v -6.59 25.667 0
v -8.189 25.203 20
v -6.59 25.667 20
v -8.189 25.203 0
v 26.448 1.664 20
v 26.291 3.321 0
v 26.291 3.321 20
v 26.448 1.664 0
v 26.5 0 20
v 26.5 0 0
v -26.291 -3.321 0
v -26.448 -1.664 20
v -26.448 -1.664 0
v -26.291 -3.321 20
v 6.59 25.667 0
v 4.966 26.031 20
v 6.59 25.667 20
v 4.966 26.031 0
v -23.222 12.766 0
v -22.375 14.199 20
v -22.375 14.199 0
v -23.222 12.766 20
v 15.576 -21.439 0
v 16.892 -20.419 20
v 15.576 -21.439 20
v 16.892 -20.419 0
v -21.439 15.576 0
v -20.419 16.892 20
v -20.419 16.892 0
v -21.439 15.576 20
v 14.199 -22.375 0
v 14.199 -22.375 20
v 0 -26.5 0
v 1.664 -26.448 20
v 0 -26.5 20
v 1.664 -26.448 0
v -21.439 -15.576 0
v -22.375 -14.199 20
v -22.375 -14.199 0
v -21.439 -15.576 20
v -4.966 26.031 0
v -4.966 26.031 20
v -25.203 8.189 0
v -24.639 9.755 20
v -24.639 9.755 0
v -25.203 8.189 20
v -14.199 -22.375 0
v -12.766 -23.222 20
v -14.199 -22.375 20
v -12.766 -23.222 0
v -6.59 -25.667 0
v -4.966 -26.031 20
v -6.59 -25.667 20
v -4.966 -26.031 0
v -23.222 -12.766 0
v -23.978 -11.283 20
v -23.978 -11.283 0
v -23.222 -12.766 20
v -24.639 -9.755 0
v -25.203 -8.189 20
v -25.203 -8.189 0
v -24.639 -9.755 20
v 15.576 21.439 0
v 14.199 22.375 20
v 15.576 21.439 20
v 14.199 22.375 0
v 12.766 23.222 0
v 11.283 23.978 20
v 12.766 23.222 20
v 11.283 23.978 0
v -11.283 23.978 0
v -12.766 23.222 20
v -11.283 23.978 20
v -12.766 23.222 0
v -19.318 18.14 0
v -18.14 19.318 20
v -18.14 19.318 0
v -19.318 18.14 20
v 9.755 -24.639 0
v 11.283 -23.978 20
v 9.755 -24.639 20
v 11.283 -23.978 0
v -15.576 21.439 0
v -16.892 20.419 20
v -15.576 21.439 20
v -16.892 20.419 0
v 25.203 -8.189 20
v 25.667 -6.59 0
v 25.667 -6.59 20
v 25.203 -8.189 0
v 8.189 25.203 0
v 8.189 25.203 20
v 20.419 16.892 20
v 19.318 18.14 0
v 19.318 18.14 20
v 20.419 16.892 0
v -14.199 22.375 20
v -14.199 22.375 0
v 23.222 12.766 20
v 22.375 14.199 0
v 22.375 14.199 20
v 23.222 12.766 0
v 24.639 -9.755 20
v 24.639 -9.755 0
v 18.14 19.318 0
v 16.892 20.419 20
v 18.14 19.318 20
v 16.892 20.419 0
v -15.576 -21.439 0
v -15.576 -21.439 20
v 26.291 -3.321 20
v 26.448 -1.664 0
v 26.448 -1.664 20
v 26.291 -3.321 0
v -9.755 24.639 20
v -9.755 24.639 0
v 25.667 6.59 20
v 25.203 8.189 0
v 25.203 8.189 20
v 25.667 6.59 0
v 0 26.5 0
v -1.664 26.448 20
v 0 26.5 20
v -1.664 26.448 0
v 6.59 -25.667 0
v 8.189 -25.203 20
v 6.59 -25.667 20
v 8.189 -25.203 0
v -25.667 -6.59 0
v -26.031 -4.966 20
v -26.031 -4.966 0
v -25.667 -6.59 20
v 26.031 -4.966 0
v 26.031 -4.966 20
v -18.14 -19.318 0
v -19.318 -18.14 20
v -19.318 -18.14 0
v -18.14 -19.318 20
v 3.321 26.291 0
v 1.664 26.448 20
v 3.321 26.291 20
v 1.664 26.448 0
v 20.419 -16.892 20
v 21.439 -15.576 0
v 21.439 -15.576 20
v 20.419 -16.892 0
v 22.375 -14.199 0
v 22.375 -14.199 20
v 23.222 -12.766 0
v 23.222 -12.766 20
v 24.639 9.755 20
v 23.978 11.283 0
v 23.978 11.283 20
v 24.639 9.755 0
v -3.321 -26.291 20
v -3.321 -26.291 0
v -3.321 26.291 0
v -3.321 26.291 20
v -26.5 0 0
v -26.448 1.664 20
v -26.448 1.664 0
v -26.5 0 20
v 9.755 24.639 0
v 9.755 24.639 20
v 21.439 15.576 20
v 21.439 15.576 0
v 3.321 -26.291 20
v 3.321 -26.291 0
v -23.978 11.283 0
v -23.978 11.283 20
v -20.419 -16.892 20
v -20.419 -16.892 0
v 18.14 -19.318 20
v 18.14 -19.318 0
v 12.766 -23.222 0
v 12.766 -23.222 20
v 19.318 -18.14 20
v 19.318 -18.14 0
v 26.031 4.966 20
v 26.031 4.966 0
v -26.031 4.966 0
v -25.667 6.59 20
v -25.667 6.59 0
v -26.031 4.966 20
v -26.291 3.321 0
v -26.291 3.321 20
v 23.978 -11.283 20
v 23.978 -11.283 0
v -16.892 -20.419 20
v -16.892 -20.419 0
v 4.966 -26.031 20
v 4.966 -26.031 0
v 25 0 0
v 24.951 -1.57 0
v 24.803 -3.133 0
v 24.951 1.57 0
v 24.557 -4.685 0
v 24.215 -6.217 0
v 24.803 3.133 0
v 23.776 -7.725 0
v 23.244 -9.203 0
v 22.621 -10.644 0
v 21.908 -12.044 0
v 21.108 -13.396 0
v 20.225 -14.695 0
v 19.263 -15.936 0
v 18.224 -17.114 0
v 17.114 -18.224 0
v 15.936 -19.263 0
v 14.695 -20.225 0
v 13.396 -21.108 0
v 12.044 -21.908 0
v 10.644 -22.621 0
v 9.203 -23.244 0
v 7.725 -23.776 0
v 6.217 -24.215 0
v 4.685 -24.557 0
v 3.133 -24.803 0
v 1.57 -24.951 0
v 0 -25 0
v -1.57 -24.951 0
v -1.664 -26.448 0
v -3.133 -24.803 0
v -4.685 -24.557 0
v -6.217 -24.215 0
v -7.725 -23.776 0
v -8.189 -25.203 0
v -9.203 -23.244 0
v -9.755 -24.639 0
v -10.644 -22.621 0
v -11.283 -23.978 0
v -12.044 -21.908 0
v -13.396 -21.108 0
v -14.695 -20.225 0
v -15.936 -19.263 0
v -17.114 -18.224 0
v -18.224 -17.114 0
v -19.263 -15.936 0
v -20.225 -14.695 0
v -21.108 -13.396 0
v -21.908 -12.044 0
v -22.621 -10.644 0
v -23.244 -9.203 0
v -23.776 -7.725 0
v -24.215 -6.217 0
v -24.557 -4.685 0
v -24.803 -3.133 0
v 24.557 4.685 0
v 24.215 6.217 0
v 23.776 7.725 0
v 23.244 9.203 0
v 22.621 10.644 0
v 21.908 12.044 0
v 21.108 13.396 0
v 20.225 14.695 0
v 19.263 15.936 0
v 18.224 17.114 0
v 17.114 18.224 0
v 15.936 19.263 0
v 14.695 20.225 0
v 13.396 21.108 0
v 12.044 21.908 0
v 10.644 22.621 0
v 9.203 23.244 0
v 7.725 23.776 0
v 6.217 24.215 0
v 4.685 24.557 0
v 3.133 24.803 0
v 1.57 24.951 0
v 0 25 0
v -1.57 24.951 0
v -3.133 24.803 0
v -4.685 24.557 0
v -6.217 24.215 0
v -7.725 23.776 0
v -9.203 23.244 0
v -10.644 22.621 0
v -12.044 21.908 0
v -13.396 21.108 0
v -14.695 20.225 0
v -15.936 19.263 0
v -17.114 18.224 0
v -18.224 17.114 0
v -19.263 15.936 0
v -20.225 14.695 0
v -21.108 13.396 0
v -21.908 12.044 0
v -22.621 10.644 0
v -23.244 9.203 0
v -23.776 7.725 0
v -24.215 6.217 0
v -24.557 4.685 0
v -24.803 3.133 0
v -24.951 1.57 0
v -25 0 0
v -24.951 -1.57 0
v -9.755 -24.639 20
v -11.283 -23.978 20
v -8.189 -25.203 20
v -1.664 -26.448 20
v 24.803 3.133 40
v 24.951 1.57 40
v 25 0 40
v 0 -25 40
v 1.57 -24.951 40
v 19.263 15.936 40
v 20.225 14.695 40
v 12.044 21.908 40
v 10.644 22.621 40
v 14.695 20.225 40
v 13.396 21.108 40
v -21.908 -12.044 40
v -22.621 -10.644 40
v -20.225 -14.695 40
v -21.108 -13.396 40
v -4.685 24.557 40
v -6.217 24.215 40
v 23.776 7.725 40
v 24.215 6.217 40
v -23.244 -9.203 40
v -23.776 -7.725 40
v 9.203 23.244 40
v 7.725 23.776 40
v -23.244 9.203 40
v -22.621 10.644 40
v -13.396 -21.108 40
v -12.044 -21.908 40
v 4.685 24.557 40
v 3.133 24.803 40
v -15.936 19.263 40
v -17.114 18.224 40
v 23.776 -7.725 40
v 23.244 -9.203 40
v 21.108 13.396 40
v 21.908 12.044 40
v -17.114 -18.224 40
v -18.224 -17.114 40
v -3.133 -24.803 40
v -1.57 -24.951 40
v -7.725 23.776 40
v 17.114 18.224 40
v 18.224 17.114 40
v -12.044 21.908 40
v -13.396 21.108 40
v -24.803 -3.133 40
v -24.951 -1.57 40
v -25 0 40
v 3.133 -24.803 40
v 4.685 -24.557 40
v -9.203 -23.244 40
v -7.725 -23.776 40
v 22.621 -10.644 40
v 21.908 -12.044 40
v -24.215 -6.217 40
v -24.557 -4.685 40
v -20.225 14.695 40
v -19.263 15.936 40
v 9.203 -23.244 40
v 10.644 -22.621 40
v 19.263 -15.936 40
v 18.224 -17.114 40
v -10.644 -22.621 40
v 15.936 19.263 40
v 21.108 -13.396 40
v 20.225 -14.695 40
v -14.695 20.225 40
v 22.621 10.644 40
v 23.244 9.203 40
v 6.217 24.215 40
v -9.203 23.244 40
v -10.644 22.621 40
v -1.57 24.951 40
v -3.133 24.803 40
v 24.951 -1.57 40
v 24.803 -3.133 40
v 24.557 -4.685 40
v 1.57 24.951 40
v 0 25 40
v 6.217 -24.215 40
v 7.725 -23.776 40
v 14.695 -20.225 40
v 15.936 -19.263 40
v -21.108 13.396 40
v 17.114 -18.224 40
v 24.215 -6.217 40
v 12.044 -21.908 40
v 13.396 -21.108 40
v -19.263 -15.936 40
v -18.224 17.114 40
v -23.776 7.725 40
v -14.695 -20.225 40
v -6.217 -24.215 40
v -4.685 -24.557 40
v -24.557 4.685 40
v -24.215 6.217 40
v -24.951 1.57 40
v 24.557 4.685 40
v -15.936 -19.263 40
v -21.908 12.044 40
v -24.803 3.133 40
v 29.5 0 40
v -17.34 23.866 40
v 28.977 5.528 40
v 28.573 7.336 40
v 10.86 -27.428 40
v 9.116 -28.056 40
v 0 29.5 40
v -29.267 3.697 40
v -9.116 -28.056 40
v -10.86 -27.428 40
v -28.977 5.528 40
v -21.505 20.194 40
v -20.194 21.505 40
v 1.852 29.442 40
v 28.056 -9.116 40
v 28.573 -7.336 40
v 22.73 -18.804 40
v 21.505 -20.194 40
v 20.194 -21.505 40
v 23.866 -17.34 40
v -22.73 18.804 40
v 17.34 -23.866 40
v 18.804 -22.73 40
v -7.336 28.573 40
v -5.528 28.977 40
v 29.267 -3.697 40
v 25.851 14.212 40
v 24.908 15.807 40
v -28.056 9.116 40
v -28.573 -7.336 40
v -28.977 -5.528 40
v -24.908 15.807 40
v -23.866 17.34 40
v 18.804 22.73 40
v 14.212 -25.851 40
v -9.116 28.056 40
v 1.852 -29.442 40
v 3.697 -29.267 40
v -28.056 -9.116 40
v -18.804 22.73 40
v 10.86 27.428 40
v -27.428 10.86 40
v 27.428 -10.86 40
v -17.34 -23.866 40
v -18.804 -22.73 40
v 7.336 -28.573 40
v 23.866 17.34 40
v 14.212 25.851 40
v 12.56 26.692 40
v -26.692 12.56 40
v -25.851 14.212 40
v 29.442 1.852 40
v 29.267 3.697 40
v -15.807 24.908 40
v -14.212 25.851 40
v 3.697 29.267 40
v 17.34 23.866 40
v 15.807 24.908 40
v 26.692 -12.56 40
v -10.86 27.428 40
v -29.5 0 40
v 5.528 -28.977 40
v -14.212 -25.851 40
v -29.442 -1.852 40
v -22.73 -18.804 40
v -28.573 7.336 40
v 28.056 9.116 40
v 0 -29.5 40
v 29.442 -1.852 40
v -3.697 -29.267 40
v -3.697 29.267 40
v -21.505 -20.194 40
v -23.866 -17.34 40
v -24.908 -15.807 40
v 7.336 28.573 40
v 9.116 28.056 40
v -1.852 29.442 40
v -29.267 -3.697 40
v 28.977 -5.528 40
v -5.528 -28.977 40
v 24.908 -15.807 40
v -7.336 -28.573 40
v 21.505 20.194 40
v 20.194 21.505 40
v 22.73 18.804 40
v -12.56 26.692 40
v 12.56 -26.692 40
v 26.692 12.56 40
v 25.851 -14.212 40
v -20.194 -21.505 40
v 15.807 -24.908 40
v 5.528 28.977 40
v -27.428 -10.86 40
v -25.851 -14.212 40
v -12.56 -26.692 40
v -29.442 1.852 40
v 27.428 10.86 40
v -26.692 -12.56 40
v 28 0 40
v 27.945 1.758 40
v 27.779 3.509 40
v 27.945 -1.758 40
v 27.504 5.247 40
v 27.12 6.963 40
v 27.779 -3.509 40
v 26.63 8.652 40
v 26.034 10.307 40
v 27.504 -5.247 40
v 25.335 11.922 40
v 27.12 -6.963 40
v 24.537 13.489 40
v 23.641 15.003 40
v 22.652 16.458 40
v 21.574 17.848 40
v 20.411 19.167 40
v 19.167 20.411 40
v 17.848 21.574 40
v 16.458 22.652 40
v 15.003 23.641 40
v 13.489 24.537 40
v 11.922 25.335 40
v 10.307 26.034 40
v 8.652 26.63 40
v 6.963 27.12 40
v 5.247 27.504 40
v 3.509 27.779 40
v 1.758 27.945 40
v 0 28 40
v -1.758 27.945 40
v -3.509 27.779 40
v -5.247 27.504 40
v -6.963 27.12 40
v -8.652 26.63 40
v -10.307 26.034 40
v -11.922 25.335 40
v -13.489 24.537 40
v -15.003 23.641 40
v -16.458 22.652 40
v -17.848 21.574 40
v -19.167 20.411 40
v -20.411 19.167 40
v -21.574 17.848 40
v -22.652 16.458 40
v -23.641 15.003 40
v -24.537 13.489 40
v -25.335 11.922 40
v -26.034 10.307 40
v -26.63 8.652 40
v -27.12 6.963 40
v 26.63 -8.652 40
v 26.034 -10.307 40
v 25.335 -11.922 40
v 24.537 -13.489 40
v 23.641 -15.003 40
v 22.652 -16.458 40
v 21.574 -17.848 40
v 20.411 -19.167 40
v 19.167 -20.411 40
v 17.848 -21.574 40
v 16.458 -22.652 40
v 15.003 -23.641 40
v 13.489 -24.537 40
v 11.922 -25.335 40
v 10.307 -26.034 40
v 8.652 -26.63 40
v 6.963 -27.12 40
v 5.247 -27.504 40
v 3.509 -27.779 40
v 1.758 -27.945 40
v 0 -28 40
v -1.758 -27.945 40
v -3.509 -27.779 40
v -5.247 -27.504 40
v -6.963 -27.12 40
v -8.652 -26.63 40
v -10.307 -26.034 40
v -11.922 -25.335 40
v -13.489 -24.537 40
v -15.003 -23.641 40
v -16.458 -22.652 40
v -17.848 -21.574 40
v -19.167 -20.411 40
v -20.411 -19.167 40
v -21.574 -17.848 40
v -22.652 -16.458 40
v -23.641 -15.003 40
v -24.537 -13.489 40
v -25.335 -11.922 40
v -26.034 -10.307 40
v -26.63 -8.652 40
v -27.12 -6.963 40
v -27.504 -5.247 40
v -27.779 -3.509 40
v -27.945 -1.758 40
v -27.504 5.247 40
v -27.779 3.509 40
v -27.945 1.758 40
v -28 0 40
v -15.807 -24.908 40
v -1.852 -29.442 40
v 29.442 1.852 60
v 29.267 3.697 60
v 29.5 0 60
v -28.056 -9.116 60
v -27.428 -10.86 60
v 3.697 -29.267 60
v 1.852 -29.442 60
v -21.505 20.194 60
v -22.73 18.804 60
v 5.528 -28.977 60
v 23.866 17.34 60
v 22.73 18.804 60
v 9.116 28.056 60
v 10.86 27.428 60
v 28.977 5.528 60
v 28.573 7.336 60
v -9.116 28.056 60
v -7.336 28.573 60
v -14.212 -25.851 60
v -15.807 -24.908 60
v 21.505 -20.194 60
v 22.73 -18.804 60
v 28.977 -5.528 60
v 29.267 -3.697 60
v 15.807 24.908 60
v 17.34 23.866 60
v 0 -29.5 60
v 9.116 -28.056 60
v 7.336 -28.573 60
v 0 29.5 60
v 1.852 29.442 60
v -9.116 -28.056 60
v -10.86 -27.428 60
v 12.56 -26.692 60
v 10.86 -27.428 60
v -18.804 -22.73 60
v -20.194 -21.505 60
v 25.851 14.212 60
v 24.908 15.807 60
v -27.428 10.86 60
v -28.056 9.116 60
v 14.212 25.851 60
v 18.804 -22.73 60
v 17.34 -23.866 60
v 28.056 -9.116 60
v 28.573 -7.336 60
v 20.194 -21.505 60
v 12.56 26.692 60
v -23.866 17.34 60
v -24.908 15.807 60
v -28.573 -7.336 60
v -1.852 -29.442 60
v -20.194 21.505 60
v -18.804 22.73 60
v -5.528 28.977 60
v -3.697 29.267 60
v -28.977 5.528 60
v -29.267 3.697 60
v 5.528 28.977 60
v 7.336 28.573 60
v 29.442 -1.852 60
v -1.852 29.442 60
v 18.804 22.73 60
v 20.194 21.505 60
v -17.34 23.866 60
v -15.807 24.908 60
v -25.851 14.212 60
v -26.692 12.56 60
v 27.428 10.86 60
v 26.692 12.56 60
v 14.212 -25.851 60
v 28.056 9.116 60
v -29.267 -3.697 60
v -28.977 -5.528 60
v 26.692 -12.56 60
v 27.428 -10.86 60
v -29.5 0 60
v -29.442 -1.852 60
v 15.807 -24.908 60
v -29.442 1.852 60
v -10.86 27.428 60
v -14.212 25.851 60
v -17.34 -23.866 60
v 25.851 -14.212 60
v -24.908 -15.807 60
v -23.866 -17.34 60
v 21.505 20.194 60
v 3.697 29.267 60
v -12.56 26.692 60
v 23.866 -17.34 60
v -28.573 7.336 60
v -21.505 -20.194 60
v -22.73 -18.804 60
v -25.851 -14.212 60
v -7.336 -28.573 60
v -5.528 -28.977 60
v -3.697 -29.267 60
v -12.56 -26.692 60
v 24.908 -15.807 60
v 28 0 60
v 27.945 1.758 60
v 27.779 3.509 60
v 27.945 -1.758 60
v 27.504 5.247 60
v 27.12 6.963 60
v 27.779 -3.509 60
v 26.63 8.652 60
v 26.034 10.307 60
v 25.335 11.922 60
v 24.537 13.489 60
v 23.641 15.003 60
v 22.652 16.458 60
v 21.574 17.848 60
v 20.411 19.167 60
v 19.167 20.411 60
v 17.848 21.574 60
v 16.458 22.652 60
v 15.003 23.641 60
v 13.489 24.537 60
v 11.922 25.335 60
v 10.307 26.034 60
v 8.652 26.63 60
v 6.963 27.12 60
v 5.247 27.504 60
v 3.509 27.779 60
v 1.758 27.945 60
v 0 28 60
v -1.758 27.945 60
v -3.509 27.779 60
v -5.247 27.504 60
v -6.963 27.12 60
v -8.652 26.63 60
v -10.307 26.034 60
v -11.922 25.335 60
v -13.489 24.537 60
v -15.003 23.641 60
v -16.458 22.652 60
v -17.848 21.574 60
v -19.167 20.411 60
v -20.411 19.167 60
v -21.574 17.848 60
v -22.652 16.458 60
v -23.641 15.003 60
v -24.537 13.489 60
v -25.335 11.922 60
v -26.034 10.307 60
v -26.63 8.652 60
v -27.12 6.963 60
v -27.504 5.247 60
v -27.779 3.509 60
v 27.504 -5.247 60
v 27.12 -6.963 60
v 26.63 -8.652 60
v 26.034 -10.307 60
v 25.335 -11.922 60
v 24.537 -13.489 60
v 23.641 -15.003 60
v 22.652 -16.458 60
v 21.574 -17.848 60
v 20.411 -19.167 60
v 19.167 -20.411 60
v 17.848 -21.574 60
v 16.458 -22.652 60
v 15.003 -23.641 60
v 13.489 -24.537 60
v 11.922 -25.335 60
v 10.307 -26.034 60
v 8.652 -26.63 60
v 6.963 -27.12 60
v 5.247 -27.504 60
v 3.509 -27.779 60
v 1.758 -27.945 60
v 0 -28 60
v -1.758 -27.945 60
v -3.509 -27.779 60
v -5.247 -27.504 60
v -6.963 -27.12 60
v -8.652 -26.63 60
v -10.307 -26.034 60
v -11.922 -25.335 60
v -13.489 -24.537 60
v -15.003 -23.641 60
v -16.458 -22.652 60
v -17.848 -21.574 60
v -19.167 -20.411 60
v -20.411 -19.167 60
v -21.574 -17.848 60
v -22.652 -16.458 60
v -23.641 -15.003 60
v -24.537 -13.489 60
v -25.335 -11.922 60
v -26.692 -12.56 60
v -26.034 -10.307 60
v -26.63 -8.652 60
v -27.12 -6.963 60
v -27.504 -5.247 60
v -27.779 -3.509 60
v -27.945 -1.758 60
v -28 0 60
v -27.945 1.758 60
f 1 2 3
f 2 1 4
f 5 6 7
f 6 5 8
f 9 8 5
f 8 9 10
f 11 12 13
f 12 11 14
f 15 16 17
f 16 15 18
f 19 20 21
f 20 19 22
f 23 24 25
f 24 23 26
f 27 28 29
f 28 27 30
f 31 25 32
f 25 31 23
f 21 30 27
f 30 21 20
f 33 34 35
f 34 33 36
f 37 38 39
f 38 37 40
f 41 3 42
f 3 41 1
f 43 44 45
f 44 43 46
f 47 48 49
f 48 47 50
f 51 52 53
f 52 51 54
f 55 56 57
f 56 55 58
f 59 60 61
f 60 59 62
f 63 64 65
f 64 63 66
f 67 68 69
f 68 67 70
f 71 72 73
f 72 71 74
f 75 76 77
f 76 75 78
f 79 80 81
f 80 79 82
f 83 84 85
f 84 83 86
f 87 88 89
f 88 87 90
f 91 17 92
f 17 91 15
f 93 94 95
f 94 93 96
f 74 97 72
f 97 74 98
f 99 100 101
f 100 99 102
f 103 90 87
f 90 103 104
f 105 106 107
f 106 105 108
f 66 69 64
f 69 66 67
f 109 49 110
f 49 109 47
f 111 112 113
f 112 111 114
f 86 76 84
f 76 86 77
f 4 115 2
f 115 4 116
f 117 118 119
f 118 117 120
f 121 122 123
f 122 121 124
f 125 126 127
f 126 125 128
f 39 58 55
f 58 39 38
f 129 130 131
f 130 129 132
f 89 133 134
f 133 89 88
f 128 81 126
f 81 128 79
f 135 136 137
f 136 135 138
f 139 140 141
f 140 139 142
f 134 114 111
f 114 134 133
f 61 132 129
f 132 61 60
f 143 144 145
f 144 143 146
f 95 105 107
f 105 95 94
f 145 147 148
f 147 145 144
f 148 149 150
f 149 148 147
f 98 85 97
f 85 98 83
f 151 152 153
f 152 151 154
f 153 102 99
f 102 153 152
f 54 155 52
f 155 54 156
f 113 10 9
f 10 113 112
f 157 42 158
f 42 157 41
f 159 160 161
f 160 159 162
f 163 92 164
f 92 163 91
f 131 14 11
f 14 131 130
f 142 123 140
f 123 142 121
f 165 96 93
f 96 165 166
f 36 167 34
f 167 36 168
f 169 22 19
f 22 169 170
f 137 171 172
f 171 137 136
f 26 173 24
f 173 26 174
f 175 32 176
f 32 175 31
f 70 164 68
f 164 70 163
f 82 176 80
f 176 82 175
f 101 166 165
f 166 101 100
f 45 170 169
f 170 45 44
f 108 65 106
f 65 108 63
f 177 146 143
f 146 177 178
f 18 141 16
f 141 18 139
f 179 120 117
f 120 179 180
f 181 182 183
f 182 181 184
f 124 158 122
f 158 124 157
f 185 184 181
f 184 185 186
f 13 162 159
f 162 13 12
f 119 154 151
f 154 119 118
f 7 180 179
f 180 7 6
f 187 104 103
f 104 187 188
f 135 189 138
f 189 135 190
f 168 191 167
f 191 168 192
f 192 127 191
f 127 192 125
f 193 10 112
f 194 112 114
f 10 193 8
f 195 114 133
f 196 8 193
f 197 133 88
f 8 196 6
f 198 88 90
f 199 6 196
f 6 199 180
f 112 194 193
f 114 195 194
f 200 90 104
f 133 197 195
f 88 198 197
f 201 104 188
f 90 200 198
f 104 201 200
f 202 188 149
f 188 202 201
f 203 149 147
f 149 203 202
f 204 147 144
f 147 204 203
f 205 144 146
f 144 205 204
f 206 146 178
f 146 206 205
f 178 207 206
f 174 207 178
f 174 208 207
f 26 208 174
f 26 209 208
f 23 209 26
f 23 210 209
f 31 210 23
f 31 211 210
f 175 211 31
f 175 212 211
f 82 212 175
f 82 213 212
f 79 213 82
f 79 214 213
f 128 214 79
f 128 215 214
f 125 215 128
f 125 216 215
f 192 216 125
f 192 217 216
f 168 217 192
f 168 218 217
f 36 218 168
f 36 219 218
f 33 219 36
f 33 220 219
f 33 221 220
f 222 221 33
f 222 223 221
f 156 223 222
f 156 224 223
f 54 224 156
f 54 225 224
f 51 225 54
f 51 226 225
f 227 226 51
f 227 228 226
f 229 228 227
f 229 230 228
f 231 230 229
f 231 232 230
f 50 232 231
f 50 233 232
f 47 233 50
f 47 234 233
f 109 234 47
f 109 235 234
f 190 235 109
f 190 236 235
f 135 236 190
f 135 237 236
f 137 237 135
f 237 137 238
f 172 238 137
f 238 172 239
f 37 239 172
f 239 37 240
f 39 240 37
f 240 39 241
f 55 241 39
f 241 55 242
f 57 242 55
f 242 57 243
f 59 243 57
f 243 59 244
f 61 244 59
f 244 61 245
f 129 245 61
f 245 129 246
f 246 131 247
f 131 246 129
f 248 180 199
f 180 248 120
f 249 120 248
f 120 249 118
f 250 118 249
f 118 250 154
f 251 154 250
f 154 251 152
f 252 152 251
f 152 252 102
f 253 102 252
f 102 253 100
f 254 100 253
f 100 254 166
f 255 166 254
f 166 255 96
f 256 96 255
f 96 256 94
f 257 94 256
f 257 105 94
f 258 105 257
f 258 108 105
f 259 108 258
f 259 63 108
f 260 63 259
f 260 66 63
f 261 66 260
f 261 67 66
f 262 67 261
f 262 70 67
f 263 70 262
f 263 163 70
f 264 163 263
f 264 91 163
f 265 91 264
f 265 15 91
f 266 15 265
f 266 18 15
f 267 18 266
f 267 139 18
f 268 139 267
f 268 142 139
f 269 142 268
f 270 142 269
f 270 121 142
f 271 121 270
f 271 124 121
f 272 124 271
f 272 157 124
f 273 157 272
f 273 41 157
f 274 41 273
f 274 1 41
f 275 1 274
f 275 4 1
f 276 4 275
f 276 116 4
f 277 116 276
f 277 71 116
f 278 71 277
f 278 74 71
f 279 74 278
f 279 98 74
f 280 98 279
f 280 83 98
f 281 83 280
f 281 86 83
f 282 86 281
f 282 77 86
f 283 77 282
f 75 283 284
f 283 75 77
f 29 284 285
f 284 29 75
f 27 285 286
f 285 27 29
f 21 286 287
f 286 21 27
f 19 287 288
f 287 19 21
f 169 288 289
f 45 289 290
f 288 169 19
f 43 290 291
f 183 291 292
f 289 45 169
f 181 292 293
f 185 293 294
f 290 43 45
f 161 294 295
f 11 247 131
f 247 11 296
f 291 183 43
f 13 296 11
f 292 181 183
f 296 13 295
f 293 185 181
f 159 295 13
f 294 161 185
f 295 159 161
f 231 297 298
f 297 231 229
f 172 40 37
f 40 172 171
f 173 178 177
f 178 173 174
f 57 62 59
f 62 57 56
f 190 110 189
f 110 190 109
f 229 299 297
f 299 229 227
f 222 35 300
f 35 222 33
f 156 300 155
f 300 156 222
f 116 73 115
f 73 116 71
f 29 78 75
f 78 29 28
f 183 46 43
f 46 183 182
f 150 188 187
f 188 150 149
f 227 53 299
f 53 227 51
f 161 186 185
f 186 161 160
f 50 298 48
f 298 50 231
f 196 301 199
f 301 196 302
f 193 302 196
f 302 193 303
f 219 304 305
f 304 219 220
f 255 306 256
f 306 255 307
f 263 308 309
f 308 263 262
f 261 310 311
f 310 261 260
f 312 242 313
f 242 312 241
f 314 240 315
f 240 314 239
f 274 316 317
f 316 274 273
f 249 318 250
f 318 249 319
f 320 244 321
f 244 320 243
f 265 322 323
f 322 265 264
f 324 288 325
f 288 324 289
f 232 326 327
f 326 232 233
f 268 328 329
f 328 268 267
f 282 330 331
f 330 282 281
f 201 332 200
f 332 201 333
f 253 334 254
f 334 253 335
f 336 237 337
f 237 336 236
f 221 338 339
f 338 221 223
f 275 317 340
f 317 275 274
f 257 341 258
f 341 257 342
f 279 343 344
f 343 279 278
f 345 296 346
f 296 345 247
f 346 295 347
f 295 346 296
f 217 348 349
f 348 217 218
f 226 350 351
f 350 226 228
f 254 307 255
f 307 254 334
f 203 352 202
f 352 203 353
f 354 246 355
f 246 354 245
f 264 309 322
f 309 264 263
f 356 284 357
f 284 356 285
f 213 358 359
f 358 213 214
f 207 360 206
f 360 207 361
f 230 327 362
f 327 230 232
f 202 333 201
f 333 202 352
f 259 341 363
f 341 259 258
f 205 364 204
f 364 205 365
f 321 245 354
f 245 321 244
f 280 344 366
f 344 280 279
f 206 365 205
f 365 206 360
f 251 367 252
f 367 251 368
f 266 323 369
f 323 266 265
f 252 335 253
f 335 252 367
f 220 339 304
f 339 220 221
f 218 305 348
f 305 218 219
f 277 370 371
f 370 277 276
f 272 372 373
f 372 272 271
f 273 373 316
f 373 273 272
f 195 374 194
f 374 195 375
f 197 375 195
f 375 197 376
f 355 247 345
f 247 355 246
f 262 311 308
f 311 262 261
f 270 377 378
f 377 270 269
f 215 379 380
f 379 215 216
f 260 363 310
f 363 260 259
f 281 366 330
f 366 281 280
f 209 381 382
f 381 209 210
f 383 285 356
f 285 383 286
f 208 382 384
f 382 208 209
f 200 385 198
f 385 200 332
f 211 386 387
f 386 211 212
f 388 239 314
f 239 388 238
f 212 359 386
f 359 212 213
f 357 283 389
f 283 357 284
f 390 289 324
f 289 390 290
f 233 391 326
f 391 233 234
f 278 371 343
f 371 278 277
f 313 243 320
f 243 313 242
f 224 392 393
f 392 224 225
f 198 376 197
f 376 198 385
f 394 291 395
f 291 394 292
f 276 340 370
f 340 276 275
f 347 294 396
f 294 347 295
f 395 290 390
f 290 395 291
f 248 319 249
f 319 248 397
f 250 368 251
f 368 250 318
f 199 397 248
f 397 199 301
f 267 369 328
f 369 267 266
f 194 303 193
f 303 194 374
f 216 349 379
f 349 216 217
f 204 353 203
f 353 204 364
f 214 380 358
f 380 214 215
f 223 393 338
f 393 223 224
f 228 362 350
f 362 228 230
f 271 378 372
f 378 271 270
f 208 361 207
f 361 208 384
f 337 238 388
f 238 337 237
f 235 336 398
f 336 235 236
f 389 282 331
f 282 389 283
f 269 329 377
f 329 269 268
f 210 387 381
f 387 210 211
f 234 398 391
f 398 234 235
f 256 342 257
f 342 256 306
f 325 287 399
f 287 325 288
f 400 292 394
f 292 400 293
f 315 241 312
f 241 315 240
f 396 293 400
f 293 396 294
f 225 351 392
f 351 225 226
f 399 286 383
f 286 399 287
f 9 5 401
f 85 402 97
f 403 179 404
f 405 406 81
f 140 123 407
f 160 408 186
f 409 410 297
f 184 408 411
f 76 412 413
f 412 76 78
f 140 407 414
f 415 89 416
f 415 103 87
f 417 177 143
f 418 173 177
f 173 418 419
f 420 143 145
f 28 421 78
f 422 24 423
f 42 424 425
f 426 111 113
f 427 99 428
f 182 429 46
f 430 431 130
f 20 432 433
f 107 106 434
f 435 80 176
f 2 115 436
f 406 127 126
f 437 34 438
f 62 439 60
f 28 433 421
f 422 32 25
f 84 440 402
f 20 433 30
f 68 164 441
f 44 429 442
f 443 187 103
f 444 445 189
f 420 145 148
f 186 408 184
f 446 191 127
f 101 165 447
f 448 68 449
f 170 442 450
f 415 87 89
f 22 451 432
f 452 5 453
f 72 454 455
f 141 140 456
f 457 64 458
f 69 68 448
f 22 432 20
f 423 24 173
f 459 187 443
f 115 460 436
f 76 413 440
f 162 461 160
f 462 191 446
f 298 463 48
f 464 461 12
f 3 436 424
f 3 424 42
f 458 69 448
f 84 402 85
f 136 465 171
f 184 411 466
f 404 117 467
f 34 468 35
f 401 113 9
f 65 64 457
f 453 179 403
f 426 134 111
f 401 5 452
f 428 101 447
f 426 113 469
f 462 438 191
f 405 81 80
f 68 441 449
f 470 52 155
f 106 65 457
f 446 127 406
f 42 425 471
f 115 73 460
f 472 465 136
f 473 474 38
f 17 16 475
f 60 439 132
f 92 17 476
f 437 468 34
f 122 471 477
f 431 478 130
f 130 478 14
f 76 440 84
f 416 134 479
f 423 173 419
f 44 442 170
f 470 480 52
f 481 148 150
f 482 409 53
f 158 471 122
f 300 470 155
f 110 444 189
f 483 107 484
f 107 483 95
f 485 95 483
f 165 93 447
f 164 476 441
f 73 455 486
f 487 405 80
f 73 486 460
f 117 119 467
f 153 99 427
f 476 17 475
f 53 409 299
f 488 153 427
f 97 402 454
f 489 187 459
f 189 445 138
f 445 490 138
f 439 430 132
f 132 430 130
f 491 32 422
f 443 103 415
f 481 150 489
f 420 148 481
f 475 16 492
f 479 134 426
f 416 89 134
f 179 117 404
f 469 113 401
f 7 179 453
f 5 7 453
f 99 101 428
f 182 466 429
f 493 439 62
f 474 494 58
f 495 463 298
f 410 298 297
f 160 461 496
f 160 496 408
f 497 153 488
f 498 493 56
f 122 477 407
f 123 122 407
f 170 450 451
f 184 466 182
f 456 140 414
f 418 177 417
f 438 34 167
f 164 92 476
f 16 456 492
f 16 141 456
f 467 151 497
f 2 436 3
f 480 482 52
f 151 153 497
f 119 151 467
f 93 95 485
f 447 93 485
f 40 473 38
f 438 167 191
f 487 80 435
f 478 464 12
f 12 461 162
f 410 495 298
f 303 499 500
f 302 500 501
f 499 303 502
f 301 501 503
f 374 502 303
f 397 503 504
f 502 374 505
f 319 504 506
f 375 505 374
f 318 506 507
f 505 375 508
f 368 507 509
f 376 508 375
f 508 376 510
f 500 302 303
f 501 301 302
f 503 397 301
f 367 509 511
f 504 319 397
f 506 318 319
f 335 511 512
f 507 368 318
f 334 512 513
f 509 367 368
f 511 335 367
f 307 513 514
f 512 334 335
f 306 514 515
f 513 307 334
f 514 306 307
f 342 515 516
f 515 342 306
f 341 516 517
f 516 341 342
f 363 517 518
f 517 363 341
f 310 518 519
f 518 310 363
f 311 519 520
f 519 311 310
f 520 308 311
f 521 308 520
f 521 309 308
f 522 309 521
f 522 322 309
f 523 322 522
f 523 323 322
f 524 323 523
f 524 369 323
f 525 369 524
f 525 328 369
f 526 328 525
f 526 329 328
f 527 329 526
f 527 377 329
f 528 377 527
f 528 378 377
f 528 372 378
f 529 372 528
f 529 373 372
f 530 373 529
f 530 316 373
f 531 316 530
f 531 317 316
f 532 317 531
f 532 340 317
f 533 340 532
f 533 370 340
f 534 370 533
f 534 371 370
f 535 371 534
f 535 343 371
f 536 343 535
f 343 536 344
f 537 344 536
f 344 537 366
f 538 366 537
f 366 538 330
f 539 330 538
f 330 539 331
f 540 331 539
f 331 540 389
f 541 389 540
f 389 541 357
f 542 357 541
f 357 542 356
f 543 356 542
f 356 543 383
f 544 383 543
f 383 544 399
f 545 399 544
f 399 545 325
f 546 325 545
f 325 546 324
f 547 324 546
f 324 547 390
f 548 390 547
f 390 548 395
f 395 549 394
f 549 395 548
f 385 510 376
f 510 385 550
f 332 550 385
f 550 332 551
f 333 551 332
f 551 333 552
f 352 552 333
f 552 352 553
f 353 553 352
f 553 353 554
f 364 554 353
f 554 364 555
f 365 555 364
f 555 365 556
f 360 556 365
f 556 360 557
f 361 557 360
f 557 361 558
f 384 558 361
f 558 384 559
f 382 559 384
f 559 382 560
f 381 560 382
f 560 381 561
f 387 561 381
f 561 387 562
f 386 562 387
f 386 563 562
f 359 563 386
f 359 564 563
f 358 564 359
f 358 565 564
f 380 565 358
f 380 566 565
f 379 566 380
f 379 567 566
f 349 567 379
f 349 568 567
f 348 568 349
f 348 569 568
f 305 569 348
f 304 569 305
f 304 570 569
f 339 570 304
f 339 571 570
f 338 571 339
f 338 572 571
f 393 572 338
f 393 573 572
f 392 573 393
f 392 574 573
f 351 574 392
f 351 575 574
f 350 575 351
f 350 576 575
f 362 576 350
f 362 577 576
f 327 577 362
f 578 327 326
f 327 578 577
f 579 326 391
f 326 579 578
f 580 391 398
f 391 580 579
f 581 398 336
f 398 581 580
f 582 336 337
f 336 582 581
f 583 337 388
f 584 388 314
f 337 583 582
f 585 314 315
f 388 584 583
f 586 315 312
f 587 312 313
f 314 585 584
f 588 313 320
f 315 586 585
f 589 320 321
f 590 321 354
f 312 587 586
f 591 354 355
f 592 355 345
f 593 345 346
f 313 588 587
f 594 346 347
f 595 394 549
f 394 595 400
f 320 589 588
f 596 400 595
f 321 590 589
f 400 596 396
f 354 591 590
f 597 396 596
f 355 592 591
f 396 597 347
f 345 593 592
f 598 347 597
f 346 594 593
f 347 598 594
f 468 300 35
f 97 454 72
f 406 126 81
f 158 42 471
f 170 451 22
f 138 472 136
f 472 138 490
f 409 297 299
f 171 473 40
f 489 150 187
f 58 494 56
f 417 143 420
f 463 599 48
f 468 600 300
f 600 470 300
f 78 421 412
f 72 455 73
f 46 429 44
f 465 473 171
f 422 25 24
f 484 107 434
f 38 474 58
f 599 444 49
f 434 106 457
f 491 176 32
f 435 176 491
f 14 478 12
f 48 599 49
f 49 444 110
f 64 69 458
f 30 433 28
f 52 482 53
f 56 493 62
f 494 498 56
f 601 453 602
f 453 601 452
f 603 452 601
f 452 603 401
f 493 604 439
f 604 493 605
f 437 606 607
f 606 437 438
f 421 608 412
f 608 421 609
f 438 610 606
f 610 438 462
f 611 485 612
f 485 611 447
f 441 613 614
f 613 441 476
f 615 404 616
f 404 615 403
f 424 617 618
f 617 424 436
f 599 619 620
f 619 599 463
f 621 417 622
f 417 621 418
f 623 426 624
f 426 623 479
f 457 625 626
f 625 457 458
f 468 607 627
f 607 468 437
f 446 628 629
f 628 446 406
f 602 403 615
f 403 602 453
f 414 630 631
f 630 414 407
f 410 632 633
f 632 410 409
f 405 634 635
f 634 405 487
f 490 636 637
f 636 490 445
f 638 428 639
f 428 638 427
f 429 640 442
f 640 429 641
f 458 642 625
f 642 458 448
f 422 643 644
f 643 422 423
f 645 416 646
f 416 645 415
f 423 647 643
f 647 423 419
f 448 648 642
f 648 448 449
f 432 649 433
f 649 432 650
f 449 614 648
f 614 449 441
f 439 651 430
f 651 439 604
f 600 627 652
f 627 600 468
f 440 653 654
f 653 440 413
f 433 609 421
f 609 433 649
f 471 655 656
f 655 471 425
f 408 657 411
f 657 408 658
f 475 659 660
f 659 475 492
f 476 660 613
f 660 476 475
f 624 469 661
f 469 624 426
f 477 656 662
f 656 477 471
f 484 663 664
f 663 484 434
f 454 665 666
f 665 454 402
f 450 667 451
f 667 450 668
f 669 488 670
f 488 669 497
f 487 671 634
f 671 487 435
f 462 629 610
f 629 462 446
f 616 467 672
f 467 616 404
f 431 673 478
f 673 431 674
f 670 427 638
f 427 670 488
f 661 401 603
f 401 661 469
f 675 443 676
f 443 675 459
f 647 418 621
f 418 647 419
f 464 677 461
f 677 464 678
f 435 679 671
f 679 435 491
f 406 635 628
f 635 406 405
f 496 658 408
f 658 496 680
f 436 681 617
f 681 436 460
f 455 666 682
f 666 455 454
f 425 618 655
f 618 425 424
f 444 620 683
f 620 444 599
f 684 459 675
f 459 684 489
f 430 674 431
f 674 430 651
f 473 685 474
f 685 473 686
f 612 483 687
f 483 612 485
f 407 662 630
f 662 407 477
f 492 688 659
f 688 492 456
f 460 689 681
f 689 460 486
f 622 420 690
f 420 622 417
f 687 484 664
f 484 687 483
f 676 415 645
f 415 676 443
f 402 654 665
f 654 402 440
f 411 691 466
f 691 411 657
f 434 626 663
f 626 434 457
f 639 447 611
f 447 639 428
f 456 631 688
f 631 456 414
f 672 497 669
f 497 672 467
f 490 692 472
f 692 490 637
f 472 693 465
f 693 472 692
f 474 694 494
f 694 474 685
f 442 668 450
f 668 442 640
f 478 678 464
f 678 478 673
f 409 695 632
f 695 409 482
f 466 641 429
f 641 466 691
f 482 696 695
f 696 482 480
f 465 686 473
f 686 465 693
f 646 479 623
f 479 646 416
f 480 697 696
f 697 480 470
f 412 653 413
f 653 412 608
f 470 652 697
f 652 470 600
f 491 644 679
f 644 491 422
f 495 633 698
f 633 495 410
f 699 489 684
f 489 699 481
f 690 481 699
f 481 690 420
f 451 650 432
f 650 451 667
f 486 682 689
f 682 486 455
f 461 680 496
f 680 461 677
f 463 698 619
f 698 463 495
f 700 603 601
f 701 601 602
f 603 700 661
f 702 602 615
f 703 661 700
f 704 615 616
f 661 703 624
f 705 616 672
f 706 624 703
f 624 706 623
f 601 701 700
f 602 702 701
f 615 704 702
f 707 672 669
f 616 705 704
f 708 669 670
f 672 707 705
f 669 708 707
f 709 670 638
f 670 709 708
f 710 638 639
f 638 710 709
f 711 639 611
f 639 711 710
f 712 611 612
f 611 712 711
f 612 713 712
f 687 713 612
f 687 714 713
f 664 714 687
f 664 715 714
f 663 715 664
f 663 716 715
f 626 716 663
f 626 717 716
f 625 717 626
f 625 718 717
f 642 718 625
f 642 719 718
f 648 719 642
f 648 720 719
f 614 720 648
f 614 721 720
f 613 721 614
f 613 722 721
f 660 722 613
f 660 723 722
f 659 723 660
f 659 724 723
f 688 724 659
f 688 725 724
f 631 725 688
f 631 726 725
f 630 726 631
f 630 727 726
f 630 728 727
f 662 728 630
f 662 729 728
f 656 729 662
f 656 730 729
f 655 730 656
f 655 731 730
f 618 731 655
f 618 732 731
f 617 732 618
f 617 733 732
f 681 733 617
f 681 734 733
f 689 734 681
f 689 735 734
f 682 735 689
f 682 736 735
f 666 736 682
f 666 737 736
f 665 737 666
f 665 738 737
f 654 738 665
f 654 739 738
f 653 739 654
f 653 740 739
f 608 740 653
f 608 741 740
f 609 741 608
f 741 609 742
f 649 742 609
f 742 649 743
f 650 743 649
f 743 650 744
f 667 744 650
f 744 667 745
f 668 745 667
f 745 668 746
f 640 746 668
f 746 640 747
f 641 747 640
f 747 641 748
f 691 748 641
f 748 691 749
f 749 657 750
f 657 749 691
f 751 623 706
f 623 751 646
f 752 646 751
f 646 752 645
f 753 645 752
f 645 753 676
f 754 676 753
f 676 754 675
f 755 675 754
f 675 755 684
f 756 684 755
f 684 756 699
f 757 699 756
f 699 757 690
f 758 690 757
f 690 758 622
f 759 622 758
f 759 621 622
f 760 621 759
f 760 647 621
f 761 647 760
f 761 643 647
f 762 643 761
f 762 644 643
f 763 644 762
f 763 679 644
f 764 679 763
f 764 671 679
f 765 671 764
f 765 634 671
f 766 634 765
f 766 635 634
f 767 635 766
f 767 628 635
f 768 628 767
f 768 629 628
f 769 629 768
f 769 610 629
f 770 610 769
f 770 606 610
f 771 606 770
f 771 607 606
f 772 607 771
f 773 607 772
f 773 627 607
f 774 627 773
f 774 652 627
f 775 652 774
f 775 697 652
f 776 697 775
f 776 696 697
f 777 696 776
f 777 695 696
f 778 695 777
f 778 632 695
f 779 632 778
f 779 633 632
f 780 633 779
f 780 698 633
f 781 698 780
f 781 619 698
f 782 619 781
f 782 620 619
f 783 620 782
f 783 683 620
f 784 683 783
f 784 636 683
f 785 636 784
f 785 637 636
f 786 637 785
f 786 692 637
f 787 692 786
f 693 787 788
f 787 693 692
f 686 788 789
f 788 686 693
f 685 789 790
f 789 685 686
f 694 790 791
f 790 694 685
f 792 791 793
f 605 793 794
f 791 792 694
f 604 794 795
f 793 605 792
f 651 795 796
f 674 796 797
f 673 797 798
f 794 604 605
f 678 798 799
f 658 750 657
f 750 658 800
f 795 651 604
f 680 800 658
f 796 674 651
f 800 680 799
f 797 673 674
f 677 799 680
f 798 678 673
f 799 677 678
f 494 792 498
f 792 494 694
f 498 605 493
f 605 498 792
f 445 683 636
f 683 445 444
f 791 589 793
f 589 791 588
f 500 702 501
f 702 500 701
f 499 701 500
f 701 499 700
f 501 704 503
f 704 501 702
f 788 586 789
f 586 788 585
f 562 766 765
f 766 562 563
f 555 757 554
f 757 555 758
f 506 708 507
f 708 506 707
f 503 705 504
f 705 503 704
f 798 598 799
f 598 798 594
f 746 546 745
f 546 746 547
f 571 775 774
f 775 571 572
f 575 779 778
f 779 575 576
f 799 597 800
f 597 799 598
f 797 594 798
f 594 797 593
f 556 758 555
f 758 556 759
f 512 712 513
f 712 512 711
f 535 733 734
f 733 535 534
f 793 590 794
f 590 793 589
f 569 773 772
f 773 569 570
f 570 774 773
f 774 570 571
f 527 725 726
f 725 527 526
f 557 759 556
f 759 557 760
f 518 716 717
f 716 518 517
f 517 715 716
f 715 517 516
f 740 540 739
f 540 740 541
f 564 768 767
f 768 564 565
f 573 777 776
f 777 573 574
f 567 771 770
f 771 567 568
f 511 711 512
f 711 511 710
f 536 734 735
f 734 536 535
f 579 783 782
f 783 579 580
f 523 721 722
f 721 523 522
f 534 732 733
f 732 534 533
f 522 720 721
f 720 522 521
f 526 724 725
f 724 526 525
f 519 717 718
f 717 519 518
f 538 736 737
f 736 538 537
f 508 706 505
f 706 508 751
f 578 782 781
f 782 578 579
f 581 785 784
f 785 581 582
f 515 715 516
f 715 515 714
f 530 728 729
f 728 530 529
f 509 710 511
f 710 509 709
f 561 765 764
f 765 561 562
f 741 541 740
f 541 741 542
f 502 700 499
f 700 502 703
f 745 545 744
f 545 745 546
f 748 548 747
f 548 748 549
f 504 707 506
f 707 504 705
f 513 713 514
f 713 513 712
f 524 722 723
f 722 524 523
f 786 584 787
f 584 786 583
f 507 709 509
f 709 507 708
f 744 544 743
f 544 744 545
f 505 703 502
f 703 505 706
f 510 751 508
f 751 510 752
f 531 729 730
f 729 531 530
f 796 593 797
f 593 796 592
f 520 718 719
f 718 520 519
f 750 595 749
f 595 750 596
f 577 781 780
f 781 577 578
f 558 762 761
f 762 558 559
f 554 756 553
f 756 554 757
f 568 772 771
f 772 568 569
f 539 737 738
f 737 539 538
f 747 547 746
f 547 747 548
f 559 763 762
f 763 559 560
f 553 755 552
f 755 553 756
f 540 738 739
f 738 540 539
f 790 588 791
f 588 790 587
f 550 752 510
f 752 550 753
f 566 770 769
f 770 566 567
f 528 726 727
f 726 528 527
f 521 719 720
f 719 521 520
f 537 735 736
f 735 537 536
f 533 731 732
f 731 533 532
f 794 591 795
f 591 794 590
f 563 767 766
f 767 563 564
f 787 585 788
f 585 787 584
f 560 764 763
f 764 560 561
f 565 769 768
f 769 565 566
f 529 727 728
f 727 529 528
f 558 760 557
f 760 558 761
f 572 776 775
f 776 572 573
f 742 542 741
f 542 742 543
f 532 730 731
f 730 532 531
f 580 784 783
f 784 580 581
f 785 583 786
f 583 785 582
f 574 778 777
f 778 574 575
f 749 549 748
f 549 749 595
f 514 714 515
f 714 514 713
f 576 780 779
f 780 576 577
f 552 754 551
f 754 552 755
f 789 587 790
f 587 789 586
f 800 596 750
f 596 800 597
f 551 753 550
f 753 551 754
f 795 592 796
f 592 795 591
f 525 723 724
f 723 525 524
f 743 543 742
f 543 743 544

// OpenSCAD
//small end inner diameter in mm
small_end_inner=50; 

//small end outer diameter in mm
small_end_outer=53; 


//small end length in mm
small_end_len=20; 

//large end inner diameter in mm
large_end_inner=56; 


//large end outer diameter in mm
large_end_outer=59; 

//large end length in mm
large_end_len=20; 


//center section length in mm
center_end_len=20; 

union() {
difference(){
cylinder(h=small_end_len, r=small_end_outer/2, center=false,$fn=100);
cylinder(h=small_end_len, r=small_end_inner/2, center=false,$fn=100);
}



translate([0,0,small_end_len]) difference(){
cylinder(h=center_end_len, r1=small_end_outer/2, r2=large_end_outer/2,center=false,$fn=100);
cylinder(h=center_end_len, r=small_end_inner/2, center=false,$fn=100);
}


translate([0,0,small_end_len+center_end_len]) difference(){
cylinder(h=large_end_len, r=large_end_outer/2, center=false,$fn=100);
cylinder(h=large_end_len, r=large_end_inner/2, center=false,$fn=100);
}


} //union


